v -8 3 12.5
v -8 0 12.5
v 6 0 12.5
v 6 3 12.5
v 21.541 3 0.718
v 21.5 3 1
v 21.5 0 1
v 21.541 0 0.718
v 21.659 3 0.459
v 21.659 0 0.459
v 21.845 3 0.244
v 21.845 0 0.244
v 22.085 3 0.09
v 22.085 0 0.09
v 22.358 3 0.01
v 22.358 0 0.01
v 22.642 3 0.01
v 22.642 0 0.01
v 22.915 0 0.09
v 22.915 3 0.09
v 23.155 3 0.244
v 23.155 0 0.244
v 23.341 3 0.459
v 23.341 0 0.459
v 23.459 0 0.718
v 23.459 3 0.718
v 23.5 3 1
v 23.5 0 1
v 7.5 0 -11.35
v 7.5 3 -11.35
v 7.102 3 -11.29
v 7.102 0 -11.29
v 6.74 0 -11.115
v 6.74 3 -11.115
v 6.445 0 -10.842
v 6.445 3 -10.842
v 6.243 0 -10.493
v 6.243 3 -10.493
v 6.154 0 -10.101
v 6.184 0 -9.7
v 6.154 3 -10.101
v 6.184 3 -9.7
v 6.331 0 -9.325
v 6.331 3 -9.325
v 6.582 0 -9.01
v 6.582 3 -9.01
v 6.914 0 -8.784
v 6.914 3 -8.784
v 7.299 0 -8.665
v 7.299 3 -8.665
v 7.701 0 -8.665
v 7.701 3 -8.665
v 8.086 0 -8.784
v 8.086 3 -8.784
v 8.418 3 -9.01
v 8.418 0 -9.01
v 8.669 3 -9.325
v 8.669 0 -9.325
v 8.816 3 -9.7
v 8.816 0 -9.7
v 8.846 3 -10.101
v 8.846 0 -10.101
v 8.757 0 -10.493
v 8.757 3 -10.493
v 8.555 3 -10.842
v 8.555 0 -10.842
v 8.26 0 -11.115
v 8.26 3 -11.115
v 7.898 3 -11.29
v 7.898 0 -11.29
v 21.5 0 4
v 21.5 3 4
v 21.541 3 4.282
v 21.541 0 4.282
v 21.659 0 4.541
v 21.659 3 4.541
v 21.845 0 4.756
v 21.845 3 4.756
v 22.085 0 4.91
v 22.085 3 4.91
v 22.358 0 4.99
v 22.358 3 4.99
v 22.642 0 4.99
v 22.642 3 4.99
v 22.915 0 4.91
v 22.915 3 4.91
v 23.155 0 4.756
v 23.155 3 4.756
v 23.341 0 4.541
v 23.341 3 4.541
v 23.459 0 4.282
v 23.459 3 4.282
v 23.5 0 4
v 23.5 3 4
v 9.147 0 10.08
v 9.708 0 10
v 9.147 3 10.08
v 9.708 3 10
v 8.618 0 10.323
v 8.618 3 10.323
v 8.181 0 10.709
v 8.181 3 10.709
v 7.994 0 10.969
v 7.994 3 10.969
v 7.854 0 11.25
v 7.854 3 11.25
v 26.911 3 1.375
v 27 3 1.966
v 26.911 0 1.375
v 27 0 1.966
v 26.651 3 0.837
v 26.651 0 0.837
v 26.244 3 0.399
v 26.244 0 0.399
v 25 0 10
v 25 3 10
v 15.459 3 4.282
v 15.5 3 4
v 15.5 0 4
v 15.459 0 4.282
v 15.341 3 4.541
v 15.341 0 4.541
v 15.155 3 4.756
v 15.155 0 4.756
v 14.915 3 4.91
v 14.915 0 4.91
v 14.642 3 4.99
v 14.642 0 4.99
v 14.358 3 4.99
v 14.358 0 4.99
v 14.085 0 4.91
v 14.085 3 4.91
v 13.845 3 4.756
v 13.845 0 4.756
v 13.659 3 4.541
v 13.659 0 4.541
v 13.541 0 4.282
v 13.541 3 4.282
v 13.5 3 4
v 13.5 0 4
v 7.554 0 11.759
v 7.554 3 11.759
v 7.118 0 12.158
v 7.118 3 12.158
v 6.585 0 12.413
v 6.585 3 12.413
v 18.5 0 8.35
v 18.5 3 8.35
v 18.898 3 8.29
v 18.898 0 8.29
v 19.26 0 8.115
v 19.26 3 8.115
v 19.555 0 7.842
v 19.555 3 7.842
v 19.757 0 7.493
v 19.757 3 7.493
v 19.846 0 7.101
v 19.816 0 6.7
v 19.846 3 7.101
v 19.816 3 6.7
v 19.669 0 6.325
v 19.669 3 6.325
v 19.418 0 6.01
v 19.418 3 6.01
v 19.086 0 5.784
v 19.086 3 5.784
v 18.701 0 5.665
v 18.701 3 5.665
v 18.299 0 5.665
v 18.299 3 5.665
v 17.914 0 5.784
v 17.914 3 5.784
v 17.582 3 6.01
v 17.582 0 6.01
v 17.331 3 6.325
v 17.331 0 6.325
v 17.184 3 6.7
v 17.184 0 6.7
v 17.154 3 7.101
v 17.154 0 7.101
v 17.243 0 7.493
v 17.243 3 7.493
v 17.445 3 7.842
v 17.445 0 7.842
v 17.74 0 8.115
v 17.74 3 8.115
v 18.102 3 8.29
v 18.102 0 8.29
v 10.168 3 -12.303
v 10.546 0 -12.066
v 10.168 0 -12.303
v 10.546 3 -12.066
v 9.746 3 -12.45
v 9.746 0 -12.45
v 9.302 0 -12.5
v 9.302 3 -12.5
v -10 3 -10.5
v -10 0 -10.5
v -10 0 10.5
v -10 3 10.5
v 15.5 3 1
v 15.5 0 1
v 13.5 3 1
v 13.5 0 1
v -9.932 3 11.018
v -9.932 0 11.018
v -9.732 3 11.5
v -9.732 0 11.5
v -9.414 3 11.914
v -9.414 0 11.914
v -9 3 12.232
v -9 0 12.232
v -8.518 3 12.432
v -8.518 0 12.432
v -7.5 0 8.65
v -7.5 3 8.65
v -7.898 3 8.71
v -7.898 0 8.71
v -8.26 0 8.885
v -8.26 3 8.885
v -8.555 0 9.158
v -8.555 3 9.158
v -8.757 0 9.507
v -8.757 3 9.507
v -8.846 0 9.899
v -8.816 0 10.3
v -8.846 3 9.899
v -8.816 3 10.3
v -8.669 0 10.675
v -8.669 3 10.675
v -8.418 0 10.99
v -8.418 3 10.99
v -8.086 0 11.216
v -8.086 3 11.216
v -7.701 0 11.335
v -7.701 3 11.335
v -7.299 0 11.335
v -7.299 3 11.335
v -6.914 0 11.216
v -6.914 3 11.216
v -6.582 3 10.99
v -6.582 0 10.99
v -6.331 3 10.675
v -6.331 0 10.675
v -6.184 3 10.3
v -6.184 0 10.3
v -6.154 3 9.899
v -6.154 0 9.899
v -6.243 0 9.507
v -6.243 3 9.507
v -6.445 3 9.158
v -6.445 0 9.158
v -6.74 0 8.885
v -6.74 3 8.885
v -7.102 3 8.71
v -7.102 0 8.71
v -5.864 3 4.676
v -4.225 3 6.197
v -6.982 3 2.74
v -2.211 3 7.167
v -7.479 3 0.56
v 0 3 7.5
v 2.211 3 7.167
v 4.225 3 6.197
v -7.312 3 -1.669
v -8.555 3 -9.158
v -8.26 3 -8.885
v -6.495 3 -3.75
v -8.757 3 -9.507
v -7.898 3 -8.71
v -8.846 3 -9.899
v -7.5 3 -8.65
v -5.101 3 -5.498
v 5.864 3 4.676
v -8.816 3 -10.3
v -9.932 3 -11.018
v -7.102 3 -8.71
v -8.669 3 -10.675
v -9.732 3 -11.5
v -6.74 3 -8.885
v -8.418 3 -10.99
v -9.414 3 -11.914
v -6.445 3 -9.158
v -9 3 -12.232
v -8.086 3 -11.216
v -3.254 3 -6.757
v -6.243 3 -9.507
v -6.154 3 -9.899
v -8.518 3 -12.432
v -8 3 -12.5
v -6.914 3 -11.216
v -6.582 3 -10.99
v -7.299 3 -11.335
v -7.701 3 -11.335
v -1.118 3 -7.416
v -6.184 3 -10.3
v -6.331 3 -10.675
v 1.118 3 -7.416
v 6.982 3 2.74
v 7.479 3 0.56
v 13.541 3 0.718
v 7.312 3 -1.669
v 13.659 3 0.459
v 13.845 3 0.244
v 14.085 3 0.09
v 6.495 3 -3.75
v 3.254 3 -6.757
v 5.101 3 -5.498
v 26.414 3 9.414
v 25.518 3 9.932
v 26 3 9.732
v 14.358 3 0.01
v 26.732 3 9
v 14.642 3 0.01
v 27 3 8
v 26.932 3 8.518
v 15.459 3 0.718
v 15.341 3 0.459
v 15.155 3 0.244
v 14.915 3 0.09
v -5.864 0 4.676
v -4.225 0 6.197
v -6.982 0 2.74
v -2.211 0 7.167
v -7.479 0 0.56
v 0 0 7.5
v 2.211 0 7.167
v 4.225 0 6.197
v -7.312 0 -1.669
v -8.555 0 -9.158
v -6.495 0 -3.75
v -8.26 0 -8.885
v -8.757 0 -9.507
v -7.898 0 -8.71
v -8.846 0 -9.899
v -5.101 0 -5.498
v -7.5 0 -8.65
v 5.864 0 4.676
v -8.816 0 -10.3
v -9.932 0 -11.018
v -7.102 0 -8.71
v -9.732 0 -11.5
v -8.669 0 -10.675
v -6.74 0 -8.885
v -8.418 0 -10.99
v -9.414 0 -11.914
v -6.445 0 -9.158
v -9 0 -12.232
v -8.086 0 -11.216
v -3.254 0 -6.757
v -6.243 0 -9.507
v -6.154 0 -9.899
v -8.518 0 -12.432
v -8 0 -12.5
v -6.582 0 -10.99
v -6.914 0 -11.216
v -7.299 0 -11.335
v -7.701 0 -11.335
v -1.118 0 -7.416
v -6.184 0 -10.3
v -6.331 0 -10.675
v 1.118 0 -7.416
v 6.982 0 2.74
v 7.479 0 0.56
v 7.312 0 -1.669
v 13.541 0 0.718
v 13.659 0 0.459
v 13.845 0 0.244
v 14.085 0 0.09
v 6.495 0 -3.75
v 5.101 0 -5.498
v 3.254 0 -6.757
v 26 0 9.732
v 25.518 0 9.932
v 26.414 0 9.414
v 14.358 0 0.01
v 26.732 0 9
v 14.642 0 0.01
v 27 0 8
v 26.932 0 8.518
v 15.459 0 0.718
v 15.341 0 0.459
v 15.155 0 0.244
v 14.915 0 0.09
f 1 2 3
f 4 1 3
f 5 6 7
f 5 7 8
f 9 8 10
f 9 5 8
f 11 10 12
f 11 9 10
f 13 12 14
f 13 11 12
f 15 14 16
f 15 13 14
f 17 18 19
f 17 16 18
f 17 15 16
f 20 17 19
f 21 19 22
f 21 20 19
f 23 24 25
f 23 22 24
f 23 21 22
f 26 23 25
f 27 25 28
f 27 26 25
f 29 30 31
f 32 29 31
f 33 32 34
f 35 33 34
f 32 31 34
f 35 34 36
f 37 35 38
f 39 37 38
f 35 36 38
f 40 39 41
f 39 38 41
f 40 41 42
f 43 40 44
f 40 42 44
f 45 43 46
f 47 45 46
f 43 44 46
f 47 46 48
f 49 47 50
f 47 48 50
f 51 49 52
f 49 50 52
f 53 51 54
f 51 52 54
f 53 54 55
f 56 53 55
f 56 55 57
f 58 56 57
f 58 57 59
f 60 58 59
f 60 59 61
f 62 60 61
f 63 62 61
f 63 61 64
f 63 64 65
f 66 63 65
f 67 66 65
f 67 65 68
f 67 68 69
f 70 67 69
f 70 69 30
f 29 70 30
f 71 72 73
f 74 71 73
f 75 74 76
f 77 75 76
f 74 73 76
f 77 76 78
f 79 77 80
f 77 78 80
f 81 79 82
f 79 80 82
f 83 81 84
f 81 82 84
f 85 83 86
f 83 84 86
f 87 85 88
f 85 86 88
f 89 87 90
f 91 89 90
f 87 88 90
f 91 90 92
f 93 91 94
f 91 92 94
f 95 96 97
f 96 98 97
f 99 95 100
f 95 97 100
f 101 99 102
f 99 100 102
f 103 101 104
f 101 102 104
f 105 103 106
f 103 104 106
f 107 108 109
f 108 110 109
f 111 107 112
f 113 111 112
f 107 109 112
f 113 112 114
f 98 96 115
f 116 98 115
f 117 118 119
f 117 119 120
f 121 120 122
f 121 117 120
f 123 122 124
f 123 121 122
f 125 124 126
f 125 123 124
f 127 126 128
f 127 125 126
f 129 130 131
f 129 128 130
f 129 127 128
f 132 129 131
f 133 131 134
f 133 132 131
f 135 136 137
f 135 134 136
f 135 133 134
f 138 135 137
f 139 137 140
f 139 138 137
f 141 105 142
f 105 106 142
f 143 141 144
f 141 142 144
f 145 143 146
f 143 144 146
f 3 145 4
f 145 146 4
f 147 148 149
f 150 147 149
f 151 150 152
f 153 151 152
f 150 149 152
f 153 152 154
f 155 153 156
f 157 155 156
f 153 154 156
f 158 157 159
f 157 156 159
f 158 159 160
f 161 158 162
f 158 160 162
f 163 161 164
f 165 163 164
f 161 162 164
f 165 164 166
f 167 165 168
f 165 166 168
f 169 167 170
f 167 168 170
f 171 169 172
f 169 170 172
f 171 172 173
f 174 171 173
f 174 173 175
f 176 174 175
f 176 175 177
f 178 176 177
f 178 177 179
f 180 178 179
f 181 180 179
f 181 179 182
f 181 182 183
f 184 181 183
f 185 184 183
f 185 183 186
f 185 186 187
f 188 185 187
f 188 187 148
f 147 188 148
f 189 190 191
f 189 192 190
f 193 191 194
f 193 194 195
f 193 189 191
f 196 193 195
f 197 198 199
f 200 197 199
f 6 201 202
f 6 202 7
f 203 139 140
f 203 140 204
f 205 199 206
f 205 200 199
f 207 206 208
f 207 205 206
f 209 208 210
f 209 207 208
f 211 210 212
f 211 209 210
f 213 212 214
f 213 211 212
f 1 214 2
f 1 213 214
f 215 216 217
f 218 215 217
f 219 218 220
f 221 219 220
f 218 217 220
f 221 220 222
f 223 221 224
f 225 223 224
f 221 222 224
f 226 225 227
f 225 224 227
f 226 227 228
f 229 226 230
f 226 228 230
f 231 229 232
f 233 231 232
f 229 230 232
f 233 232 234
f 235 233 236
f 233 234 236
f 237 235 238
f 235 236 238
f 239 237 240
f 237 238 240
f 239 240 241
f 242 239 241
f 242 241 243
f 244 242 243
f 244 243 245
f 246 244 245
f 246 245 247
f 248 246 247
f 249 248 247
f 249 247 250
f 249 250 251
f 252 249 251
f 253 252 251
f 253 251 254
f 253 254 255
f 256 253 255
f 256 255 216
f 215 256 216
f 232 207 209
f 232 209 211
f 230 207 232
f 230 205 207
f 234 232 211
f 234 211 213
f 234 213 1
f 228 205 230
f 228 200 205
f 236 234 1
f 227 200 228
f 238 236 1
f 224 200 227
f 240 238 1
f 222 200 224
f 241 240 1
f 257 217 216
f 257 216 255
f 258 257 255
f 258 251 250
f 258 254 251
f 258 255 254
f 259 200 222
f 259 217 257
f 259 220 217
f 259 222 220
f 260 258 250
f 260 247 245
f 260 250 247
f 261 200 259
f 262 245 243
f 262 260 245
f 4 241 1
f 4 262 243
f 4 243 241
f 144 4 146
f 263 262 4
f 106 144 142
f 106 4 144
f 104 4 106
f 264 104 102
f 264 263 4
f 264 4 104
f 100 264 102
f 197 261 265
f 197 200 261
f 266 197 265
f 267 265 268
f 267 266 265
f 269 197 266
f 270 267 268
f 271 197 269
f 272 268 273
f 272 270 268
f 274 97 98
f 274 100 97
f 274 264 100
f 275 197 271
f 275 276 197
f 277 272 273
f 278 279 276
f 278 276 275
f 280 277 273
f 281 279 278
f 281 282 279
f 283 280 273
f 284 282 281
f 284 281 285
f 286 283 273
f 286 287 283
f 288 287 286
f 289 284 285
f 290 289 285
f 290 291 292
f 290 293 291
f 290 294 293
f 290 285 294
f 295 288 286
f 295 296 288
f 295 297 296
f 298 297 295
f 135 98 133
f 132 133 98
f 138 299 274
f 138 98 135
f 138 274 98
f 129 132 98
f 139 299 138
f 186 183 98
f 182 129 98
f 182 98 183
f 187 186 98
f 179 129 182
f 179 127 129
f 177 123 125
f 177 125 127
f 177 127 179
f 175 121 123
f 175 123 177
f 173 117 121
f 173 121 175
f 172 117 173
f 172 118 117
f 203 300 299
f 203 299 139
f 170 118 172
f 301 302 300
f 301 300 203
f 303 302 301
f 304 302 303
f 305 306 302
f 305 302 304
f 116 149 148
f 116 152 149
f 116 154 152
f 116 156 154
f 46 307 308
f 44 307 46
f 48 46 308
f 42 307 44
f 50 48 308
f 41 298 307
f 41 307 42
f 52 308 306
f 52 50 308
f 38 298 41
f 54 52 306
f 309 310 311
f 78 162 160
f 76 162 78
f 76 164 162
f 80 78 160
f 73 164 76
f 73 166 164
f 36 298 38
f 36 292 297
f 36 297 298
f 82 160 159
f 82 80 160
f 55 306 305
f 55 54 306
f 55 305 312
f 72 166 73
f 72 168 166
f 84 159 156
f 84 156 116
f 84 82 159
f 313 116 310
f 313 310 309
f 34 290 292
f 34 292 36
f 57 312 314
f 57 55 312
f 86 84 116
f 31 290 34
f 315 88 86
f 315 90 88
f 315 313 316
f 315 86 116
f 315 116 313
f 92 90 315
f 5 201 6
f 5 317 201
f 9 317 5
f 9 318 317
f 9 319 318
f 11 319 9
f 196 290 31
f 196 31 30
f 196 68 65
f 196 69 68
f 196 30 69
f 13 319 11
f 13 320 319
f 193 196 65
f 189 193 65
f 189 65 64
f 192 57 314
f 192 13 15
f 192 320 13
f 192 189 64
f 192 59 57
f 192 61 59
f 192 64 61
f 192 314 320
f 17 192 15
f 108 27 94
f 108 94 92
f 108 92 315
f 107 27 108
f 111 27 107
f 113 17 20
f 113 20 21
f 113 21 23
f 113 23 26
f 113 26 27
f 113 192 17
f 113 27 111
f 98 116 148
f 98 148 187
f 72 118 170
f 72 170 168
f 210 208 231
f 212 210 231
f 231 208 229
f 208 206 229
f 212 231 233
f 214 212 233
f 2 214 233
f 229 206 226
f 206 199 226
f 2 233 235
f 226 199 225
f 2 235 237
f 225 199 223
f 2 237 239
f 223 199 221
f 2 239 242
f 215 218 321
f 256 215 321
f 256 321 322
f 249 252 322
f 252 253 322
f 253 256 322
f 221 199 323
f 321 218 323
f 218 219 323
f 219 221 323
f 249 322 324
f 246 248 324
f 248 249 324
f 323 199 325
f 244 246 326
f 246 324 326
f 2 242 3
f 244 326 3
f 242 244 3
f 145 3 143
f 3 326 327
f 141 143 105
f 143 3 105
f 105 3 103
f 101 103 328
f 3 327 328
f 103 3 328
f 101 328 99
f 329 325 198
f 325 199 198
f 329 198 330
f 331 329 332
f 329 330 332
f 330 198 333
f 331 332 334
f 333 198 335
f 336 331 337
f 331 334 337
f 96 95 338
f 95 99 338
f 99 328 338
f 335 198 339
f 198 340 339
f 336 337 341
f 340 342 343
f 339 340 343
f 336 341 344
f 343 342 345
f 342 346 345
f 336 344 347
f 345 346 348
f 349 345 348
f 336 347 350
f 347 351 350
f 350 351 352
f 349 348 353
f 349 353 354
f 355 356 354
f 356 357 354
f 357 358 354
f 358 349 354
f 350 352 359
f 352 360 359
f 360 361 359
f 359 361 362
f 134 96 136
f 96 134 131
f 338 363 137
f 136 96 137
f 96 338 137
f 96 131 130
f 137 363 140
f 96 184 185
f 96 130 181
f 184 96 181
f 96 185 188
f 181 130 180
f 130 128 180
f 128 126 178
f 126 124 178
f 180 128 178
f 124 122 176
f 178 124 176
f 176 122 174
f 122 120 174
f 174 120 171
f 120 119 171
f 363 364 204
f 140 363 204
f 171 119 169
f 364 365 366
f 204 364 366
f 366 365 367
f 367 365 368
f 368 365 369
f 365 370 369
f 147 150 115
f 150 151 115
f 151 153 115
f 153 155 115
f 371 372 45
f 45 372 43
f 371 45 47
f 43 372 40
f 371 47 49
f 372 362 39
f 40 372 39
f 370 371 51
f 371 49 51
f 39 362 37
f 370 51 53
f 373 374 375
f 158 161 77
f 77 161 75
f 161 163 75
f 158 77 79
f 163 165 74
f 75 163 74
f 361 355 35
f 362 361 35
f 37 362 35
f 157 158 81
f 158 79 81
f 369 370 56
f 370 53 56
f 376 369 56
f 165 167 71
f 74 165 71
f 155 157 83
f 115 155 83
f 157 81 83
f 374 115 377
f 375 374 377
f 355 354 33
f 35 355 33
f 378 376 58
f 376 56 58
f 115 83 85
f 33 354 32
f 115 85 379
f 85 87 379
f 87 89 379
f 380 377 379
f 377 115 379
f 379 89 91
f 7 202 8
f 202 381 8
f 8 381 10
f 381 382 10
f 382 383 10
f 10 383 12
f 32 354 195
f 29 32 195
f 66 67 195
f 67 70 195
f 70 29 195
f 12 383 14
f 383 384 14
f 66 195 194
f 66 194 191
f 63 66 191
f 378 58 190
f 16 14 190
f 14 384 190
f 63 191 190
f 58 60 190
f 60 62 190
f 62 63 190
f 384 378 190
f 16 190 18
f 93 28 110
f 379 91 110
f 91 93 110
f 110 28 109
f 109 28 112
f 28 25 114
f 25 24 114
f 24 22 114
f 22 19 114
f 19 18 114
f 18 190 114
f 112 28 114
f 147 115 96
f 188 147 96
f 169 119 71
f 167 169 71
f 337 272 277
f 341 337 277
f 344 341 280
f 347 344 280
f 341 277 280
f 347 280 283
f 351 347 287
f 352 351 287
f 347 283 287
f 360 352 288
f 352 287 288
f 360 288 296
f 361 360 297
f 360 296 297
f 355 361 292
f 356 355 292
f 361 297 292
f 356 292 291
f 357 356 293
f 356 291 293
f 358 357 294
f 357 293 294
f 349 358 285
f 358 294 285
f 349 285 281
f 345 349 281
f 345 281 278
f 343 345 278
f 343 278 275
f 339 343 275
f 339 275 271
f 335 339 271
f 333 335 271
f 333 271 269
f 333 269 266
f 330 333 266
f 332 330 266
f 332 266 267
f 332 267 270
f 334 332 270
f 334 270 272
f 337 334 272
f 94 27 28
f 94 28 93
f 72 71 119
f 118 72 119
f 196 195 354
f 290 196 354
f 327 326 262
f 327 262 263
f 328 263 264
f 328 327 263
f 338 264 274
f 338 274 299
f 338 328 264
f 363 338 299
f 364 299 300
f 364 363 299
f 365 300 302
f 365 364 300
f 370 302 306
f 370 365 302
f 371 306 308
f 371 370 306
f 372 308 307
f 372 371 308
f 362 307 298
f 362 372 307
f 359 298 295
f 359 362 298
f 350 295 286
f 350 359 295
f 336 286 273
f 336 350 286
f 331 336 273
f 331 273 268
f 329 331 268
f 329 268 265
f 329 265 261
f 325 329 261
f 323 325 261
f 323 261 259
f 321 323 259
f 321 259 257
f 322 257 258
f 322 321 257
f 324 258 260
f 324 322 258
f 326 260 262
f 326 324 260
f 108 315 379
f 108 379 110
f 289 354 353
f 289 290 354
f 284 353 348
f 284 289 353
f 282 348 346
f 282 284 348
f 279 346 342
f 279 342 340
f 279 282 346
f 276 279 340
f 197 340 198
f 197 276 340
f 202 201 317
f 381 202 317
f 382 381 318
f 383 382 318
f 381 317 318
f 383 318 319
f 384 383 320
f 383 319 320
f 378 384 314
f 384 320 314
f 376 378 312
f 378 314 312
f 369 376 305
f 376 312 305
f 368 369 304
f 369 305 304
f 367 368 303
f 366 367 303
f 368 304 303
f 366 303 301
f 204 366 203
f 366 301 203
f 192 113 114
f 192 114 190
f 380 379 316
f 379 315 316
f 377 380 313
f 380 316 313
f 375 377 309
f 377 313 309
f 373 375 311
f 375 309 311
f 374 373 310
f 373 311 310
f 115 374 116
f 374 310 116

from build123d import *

# Parameters (mm, degrees)
SKETCH_1_R          = 7.5
EXTRUDE_1_DEPTH     = 3
SKETCH_3_R          = 1.35
CUT_EXTRUDE_1_DEPTH = 30.904013109
EXTRUDE_2_DEPTH     = 3
CUT_EXTRUDE_3_DEPTH = 30.904013109
FILLET_1_R          = 2
FILLET_2_R          = 2


with BuildPart() as part:
    # 草图1 → 凸台-拉伸1 (new body)
    with BuildSketch(Plane(origin=(0, 0, 0), x_dir=(1, 0, 0), z_dir=(0, 1, 0))):
        Polygon((-10, -12.5), (0, -12.5), (8, -12.5), (8, -10), (27, -10), (27, -4), (10, -4), (10, 12.5), (-10, 12.5), align=None)
        with Locations(Location((0, 0, 0), (0, 0, 270))):
            Circle(SKETCH_1_R, mode=Mode.SUBTRACT)
    extrude(amount=EXTRUDE_1_DEPTH)

    # 草图3 → 切除-拉伸1 (cut, through all)
    with BuildSketch(Plane(origin=(0, 3, 0), x_dir=(1, 0, 0), z_dir=(0, 1, 0))):
        with Locations(Location((18.5, -7, 0), (0, 0, 270))):
            Circle(SKETCH_3_R)
        with Locations(Location((-7.5, 10, 0), (0, 0, 270))):
            Circle(SKETCH_3_R)
        with Locations(Location((-7.5, -10, 0), (0, 0, 90))):
            Circle(SKETCH_3_R)
        with Locations(Location((7.5, 10, 0), (0, 0, 90))):
            Circle(SKETCH_3_R)
    extrude(amount=-CUT_EXTRUDE_1_DEPTH, mode=Mode.SUBTRACT)

    # 草图5 → 凸台-拉伸2 (add)
    with BuildSketch(Plane(origin=(0, 3, 0), x_dir=(1, 0, 0), z_dir=(0, 1, 0))):
        Polygon((23.5, -4), (27, -4), (27, -1), (10, 12.5), (10, -4), (13.5, -4), (13.5, -1), (23.5, -1), align=None)
    extrude(amount=-EXTRUDE_2_DEPTH)

    # 草图7 → 切除-拉伸3 (cut, through all)
    with BuildSketch(Plane(origin=(0, 3, 0), x_dir=(1, 0, 0), z_dir=(0, 1, 0))):
        with BuildLine():
            Line((23.5, -1), (21.5, -1))
            ThreePointArc((21.5, -1), (22.5, 0), (23.5, -1))
        make_face()
        with BuildLine():
            Line((13.5, -1), (15.5, -1))
            ThreePointArc((15.5, -1), (14.5, 0), (13.5, -1))
        make_face()
        with BuildLine():
            Line((13.5, -4), (15.5, -4))
            ThreePointArc((15.5, -4), (14.5, -5), (13.5, -4))
        make_face()
        with BuildLine():
            Line((23.5, -4), (21.5, -4))
            ThreePointArc((21.5, -4), (22.5, -5), (23.5, -4))
        make_face()
    extrude(amount=-CUT_EXTRUDE_3_DEPTH, mode=Mode.SUBTRACT)

    # 圆角1
    fillet_1_edges = [part.edges().sort_by_distance(p)[0] for p in [
        (27, 1.5, 10),
        (8, 1.5, 12.5),
        (-10, 1.5, 12.5),
        (-10, 1.5, -12.5),
    ]]
    fillet(fillet_1_edges, radius=FILLET_1_R)

    # 圆角2
    fillet_2_edges = [part.edges().sort_by_distance(p)[0] for p in [
        (8, 1.5, 10),
        (10, 1.5, -12.5),
        (27, 1.5, 1),
    ]]
    fillet(fillet_2_edges, radius=FILLET_2_R)


solid = part.part
